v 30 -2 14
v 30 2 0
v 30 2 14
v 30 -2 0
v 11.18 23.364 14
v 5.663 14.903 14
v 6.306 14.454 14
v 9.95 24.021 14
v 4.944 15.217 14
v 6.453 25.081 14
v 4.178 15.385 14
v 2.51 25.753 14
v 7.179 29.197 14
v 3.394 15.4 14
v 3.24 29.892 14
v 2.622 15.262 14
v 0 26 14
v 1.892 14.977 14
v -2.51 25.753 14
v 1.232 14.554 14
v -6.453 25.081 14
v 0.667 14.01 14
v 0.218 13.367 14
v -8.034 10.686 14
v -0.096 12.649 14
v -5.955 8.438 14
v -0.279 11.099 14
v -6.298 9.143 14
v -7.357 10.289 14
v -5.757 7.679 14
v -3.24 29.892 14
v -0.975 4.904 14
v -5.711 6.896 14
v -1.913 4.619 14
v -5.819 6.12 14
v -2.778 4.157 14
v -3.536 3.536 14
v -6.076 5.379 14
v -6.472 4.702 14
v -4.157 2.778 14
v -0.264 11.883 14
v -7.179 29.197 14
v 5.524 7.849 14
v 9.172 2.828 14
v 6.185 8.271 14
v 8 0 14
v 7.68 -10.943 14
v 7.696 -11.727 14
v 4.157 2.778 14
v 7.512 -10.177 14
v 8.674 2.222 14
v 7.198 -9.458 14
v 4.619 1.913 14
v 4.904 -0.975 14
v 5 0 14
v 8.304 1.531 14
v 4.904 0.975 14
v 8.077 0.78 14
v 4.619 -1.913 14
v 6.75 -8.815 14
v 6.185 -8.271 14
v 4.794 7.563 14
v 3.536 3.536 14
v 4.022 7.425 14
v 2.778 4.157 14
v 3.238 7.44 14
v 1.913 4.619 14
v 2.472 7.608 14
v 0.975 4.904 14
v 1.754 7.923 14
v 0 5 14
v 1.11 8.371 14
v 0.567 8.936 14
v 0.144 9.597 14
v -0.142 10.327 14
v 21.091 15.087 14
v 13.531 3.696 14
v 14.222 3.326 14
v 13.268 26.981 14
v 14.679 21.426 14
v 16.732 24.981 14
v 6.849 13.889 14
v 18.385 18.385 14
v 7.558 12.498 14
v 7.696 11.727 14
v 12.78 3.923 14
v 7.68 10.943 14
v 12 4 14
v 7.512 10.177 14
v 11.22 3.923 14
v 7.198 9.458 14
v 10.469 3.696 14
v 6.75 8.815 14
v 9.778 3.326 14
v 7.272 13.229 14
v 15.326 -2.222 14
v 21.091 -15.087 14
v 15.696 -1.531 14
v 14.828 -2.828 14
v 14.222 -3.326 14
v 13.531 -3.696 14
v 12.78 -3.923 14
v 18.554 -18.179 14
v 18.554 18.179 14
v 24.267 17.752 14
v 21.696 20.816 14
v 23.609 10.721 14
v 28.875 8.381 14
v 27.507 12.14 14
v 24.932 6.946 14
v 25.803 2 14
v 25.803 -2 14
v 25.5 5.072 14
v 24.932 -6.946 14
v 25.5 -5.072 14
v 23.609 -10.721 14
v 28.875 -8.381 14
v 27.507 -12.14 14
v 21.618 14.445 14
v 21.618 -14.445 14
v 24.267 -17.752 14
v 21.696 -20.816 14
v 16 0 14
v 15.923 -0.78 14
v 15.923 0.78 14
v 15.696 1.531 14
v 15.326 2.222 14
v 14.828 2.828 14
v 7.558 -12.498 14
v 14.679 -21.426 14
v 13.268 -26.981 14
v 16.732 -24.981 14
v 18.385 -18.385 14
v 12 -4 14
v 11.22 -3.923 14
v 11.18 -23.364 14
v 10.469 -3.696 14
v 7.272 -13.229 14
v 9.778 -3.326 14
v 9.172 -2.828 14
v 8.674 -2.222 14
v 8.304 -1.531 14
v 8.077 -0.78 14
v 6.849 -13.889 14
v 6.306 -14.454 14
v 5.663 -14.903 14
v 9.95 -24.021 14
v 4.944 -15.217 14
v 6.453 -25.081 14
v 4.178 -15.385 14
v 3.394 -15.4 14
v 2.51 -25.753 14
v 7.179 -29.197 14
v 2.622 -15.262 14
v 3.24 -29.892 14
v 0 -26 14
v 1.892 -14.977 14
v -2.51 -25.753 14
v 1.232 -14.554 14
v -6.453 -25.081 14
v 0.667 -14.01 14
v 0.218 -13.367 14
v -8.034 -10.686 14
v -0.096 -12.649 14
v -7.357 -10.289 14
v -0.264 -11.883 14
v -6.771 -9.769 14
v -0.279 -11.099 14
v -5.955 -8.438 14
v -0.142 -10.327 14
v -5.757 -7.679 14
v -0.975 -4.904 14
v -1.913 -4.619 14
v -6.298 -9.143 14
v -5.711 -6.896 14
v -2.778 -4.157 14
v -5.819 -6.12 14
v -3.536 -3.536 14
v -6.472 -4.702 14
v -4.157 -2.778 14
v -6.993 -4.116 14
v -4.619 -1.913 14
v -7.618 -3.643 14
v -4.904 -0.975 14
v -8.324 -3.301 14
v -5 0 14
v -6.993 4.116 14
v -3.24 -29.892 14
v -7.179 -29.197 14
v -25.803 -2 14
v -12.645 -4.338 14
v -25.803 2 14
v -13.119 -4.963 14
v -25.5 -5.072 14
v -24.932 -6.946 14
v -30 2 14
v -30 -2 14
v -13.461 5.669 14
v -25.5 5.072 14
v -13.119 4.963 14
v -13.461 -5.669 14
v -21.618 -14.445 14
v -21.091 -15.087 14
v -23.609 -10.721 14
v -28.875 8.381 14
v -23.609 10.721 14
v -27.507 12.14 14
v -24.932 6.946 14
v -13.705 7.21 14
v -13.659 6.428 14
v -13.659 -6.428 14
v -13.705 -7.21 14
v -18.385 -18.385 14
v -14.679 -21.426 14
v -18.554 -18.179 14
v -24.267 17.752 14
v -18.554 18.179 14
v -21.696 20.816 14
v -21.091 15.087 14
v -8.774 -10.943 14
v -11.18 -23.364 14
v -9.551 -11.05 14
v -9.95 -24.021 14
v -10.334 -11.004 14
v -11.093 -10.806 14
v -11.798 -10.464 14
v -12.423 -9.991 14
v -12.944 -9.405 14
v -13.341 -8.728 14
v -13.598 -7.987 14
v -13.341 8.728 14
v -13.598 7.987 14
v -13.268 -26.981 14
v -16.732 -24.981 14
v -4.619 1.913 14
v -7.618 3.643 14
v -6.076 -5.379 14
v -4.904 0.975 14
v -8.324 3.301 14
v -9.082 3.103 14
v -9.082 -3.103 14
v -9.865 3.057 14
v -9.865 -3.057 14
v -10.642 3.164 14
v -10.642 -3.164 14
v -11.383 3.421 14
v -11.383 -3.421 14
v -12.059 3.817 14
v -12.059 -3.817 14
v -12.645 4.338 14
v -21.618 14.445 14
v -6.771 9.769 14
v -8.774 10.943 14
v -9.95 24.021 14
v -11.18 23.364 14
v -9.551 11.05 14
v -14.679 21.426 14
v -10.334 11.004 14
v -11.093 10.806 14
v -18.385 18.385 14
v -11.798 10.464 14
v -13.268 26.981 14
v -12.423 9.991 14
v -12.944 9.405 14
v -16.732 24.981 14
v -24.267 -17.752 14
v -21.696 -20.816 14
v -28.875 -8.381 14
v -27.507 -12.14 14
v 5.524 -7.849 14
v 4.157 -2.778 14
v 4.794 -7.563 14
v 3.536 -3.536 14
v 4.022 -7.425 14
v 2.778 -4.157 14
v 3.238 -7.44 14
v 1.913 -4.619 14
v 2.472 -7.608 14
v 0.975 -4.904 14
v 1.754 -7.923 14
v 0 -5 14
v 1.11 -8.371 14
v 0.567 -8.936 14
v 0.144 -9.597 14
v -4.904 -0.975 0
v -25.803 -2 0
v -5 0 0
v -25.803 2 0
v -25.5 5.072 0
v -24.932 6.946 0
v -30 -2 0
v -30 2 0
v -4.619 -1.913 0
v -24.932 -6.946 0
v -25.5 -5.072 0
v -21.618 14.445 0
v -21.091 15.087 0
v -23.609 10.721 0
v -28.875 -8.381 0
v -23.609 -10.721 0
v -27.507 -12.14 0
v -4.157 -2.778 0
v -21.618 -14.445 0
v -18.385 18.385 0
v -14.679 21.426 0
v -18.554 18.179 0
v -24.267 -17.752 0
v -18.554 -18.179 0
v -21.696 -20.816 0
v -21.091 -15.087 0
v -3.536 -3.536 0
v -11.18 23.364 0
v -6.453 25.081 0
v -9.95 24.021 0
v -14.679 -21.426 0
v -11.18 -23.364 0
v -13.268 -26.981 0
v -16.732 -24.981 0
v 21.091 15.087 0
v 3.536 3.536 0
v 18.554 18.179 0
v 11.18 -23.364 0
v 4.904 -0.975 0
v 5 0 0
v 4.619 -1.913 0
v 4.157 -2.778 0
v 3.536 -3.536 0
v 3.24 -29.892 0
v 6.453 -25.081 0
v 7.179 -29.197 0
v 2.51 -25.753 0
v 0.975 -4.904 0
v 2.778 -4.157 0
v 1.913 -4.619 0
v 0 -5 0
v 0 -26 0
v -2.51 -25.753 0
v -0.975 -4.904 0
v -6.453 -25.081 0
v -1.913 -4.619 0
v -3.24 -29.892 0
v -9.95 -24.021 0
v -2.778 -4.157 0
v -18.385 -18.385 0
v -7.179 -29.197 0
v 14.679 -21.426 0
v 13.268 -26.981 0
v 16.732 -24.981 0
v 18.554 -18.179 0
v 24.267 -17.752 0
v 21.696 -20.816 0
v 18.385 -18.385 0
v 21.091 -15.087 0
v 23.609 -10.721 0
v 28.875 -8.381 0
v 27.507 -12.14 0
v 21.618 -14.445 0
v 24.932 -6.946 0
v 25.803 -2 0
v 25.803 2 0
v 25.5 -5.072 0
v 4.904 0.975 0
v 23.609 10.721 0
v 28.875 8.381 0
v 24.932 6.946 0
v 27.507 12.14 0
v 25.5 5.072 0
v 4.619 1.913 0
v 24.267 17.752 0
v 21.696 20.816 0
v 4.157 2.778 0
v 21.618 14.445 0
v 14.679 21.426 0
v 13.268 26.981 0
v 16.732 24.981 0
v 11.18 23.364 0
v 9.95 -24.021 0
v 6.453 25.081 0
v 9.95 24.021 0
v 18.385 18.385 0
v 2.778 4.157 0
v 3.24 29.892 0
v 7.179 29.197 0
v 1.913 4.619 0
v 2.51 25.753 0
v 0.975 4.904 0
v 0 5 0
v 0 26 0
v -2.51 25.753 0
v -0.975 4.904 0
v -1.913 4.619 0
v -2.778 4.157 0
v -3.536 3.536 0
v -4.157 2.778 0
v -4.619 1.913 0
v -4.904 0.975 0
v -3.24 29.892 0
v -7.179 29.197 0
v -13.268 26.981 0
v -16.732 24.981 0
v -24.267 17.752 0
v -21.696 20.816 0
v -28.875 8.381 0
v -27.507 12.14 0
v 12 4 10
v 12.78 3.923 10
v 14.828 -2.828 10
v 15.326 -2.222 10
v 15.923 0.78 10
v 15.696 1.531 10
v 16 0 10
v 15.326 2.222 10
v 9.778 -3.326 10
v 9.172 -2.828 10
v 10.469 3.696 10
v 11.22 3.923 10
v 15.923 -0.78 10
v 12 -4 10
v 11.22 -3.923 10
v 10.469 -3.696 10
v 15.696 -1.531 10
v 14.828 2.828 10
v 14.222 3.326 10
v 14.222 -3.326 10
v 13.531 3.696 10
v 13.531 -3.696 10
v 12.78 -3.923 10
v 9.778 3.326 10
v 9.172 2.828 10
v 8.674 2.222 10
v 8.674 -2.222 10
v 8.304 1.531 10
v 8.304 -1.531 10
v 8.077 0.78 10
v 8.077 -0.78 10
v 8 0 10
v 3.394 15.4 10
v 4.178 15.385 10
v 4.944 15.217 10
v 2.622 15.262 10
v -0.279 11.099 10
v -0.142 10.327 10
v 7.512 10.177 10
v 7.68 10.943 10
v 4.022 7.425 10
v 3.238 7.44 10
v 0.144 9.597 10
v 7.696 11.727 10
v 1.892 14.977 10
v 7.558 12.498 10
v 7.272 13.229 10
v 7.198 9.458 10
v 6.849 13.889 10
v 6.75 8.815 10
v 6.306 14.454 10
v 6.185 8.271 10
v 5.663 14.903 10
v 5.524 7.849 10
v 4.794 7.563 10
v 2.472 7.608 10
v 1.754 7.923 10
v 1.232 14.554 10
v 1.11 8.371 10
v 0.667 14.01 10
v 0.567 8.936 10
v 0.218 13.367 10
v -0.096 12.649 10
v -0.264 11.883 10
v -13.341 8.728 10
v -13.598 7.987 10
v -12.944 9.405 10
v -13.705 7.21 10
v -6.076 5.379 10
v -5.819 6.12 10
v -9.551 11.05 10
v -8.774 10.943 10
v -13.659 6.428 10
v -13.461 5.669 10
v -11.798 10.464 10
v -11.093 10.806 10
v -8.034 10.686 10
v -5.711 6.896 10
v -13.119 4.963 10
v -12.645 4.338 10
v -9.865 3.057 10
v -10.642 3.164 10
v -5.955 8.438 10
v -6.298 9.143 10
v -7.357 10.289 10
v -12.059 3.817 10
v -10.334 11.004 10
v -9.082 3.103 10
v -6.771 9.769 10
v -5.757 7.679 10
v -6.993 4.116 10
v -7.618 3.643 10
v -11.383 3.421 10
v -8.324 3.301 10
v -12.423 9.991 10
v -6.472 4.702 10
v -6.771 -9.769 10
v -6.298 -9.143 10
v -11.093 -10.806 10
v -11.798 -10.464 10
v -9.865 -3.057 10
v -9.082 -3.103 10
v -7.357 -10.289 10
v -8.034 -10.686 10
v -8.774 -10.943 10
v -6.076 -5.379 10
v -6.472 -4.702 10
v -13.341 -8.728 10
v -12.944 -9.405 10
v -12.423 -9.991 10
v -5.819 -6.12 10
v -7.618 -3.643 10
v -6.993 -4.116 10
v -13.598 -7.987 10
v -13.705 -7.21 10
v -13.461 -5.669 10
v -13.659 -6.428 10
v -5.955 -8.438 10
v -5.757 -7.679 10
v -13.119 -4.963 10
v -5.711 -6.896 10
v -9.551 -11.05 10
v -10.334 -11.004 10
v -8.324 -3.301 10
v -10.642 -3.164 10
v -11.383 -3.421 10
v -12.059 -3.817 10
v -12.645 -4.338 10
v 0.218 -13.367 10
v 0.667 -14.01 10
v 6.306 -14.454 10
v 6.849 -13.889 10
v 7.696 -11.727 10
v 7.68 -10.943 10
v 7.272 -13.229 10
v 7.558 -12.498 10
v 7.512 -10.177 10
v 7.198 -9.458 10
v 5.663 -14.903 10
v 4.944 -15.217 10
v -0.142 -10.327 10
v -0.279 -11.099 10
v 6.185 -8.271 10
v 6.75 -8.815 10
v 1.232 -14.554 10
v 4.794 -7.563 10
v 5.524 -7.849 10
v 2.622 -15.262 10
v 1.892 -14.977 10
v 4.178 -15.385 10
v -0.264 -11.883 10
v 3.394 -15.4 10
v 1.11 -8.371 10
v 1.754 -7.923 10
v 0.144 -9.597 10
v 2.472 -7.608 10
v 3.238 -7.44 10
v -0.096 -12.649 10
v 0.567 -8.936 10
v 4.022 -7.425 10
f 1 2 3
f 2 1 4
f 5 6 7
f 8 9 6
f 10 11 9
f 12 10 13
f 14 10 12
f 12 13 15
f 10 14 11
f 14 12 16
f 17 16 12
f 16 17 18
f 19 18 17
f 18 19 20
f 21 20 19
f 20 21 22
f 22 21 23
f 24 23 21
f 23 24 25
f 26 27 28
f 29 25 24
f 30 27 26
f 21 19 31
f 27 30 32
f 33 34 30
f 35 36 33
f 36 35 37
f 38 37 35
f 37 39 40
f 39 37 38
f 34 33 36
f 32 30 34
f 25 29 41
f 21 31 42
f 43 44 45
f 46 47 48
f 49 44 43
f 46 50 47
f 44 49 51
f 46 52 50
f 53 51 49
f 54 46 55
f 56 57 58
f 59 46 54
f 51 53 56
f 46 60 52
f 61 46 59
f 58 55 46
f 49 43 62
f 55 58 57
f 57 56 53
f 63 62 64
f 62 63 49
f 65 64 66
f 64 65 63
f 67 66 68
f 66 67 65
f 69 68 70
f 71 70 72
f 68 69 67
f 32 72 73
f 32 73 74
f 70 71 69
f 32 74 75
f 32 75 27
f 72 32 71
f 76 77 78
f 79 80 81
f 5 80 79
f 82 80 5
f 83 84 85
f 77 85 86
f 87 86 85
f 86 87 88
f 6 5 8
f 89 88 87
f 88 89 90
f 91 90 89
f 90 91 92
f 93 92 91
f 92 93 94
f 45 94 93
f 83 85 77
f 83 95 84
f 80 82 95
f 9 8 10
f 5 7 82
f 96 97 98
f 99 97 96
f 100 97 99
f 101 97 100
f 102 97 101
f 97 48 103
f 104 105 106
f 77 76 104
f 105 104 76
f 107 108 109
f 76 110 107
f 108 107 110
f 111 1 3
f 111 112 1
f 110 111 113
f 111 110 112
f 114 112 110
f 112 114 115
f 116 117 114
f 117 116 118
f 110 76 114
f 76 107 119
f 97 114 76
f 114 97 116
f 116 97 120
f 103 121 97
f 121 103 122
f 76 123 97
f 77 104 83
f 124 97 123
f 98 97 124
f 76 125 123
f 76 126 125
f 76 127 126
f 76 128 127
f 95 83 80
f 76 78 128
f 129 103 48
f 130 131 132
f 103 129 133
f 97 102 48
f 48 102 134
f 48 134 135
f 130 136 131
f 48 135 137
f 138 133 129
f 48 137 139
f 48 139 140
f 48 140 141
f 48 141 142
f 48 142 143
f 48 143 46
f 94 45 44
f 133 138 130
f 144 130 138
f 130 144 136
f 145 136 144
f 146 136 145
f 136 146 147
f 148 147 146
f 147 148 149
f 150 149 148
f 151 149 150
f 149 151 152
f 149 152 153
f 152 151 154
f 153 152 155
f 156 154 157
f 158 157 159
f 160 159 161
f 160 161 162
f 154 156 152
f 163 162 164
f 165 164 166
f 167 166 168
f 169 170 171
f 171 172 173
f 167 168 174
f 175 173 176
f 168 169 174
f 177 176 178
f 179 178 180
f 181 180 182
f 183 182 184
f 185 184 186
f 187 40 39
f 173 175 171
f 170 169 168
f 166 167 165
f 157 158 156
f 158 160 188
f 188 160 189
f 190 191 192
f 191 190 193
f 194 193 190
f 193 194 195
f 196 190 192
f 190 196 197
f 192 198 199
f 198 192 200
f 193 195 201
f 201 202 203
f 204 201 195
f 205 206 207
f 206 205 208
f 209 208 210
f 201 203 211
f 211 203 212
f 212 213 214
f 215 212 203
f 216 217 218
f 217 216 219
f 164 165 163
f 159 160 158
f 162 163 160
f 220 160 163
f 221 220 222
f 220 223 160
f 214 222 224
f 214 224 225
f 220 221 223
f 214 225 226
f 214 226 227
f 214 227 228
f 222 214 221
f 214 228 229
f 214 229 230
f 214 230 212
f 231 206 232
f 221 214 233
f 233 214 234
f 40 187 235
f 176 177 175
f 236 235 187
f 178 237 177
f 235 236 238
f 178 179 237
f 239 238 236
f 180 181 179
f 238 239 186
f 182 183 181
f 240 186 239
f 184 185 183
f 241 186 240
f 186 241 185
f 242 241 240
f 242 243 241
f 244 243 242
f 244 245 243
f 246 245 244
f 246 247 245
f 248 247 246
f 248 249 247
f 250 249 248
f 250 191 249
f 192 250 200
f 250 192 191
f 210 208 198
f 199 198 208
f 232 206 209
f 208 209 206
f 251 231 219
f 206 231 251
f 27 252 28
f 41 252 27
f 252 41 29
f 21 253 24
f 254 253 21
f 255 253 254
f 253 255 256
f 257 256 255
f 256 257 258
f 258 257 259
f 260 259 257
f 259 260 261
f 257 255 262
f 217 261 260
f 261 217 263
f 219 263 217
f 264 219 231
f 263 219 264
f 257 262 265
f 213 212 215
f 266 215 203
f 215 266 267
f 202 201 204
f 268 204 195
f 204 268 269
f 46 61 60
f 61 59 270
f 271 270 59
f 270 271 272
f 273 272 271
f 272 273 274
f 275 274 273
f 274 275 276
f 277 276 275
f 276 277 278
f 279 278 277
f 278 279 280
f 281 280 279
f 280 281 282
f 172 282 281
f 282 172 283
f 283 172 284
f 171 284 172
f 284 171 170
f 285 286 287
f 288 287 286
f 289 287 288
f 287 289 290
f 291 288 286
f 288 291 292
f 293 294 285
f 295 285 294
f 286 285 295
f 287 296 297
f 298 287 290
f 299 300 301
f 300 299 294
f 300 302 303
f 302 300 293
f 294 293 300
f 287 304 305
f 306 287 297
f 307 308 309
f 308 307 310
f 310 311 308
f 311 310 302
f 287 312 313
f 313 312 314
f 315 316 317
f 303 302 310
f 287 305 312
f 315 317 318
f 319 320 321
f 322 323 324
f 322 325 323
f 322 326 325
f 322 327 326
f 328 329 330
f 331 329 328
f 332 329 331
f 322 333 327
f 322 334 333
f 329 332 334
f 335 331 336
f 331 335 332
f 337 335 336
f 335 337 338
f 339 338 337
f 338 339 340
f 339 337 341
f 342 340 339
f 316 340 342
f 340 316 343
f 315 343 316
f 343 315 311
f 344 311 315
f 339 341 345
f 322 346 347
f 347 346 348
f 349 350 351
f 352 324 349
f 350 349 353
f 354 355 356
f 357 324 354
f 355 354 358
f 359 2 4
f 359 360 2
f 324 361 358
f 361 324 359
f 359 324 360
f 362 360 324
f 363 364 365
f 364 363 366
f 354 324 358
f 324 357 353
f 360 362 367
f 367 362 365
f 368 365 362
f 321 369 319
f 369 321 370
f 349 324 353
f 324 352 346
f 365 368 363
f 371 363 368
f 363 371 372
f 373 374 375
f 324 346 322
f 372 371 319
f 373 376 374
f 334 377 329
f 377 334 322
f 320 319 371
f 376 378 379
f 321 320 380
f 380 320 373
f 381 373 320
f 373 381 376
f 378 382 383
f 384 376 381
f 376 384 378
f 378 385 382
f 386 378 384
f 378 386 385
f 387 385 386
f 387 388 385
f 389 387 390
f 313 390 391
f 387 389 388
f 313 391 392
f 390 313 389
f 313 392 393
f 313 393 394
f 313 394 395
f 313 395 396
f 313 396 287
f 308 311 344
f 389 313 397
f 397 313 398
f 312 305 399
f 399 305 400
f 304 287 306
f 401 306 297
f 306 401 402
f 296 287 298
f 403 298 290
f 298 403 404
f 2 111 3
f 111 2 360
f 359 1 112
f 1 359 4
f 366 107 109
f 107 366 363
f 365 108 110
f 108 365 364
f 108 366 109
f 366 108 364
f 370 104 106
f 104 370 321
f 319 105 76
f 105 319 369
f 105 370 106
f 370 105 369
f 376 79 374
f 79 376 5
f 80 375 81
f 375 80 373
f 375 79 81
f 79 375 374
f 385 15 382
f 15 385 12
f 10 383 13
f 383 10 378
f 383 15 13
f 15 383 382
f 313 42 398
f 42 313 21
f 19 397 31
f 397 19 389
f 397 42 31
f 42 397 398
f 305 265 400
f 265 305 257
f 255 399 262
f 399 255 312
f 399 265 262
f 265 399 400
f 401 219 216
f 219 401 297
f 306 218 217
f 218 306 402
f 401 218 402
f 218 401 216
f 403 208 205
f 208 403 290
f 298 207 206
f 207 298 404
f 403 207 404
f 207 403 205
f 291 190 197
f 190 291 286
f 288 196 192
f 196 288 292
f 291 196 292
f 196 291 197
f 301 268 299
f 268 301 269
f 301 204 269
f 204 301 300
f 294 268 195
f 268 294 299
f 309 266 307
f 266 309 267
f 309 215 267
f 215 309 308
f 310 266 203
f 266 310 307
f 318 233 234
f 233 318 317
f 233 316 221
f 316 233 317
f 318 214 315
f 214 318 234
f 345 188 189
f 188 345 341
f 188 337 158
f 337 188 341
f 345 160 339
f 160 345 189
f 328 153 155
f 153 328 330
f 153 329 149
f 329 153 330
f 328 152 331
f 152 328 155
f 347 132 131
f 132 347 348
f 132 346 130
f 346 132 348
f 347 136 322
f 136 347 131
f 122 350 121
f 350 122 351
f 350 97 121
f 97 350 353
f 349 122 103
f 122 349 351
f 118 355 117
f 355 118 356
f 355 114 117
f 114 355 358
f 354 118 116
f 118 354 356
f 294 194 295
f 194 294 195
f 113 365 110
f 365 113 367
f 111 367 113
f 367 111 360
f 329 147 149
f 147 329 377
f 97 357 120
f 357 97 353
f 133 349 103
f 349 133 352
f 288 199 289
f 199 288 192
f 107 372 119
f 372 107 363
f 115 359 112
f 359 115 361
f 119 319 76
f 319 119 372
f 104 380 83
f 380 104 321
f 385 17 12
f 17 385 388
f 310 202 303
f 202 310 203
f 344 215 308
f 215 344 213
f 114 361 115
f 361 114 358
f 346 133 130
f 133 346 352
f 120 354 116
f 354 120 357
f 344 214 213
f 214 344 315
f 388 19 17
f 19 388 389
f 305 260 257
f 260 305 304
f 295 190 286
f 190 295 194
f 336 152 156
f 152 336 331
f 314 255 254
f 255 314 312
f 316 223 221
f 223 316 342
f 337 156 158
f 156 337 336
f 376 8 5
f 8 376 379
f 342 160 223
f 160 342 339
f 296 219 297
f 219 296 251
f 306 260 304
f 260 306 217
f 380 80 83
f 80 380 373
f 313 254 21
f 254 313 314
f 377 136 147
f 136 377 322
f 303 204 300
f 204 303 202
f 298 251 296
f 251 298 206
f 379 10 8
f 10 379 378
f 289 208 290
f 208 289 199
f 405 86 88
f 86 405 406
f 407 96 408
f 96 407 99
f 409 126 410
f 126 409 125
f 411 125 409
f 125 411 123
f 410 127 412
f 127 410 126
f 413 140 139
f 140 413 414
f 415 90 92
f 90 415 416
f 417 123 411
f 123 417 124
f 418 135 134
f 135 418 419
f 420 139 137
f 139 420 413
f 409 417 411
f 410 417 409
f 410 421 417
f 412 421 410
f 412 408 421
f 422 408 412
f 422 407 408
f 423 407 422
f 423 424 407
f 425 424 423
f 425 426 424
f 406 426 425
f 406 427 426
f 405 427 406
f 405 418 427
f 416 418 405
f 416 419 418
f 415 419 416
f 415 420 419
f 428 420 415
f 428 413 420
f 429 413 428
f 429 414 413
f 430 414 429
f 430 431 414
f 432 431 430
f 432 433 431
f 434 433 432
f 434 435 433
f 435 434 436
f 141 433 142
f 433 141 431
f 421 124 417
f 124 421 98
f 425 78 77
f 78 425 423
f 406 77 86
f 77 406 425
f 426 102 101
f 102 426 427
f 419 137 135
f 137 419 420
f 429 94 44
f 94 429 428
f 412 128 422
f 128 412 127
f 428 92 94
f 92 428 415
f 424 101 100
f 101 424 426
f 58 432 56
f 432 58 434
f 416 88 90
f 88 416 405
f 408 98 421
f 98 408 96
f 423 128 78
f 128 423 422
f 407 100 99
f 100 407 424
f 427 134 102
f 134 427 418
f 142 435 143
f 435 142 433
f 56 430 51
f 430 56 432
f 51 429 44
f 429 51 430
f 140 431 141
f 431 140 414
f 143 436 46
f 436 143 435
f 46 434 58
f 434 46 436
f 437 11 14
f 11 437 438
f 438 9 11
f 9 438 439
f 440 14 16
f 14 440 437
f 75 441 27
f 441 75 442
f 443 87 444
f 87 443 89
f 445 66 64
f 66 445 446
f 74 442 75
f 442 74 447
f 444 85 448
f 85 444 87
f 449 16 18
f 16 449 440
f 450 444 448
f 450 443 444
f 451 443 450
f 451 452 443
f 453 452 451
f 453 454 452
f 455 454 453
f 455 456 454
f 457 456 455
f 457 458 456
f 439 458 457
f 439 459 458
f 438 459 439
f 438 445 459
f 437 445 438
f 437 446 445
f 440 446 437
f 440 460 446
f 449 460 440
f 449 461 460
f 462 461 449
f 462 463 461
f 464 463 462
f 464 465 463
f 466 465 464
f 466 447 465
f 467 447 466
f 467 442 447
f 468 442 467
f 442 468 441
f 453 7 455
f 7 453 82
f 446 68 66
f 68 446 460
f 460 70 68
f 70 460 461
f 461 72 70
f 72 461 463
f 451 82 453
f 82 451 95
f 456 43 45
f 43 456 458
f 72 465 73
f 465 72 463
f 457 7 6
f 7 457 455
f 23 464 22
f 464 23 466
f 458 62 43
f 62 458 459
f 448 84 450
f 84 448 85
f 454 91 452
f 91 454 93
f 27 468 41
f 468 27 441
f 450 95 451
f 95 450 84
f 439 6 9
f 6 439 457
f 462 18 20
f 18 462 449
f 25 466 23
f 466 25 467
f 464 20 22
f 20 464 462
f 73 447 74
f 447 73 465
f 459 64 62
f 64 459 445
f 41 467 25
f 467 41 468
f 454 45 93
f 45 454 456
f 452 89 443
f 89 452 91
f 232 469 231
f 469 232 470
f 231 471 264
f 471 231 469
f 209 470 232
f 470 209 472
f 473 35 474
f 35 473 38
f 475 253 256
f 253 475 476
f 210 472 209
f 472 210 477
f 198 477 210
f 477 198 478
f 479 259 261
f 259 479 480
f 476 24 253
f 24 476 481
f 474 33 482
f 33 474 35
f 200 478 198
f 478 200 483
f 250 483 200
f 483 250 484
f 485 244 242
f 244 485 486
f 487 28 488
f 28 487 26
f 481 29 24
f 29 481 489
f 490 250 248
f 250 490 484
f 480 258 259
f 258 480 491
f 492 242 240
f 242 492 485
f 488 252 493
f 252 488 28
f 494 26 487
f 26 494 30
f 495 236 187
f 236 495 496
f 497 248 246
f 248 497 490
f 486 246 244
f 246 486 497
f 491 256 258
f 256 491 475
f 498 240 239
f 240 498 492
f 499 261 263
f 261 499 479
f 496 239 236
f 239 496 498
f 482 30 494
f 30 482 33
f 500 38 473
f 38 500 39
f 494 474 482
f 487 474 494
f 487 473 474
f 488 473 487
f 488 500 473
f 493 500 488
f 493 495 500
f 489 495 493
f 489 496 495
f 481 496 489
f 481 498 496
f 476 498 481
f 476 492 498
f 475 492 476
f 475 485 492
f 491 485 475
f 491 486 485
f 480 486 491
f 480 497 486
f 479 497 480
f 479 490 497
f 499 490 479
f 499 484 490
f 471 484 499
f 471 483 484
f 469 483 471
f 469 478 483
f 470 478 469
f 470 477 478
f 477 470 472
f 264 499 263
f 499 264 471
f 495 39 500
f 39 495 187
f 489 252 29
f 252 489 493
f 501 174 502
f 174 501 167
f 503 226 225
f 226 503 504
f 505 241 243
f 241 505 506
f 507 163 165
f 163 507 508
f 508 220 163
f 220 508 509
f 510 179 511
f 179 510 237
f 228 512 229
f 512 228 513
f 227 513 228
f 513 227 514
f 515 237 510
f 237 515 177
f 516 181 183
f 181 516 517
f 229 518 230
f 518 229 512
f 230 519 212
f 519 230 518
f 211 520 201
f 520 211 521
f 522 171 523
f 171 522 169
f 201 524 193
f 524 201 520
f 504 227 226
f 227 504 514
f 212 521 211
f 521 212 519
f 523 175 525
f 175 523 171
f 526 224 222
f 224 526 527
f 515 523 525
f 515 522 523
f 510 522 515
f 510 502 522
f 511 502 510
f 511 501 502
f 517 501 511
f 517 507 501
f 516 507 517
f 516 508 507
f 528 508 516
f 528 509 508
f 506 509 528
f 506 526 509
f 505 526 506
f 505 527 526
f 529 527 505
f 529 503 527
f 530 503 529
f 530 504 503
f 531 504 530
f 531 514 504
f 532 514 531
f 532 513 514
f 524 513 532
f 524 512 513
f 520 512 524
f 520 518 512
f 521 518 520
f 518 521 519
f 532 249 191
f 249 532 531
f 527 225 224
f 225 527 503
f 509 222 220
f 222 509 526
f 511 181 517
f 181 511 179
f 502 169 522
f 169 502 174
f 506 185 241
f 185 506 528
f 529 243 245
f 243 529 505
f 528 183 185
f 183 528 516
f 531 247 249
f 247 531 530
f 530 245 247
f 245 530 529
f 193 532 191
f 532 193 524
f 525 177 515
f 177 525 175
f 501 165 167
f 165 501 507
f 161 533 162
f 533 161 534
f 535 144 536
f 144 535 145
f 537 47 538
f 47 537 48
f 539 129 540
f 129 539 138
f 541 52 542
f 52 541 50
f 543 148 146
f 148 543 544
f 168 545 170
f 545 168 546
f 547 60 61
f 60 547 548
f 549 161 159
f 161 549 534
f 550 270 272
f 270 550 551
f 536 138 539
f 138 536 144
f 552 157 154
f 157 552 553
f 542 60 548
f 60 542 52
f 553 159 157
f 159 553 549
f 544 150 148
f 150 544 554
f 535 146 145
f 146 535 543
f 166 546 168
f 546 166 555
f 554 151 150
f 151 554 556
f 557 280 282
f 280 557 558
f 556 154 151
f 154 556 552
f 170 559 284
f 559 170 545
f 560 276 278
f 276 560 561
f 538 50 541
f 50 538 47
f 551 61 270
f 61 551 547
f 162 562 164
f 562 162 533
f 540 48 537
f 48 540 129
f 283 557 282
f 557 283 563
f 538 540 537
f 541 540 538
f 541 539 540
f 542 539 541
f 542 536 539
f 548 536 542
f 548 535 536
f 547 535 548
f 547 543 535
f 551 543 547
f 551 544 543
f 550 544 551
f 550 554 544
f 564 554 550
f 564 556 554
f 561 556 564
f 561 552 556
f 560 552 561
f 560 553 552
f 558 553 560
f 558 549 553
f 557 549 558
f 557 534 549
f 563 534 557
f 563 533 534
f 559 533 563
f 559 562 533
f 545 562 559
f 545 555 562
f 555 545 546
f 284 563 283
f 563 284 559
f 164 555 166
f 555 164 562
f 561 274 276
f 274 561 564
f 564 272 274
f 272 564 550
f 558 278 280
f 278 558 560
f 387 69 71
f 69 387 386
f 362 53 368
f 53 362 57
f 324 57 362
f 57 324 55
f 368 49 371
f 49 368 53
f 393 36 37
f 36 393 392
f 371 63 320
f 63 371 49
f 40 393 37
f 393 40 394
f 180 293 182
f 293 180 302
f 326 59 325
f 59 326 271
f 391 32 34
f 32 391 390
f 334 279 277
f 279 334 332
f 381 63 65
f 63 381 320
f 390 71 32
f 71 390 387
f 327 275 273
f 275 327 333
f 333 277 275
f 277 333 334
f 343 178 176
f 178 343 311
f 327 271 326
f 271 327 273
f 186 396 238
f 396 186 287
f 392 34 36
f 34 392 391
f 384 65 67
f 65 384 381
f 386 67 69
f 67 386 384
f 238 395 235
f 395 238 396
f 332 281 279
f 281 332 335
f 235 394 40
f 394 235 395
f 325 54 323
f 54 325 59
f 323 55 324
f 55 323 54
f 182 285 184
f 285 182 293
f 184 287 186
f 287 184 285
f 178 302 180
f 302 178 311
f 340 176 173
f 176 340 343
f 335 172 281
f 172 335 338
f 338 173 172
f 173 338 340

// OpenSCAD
$fn = 32;

// ----------------------------------------------------------------------
// Spur blank: lightened gear blank
// ----------------------------------------------------------------------

// --- parameters (mm) ---
disc_r = 26;              // blank root radius
disc_t = 14;              // blank thickness
n_teeth = 18;             // stub tooth count
tooth_w = 4;              // tooth width at the root
tooth_h = 4;              // tooth height above the root
bore_r = 5;               // central bore radius
ring_r = 12;              // lightening pocket ring radius
pocket_r = 4;             // lightening pocket radius

out_r = disc_r + tooth_h;  // tip radius
bbox_x = 60.0;  // measured width over the teeth
bbox_y = 59.78;  // measured depth over the teeth

difference() {
union() {
  cylinder(r = disc_r, h = disc_t);
  for (i = [0 : n_teeth - 1])
    rotate([0, 0, i * 360 / n_teeth])
      translate([disc_r - 1, -tooth_w / 2, 0])
        cube([tooth_h + 1, tooth_w, disc_t]);
}
  translate([0, 0, -1]) cylinder(r = bore_r, h = disc_t + 2);
  for (i = [0 : 5])
    rotate([0, 0, i * 72])
      translate([ring_r, 0, disc_t - 4])
        cylinder(r = pocket_r, h = 5);
}
